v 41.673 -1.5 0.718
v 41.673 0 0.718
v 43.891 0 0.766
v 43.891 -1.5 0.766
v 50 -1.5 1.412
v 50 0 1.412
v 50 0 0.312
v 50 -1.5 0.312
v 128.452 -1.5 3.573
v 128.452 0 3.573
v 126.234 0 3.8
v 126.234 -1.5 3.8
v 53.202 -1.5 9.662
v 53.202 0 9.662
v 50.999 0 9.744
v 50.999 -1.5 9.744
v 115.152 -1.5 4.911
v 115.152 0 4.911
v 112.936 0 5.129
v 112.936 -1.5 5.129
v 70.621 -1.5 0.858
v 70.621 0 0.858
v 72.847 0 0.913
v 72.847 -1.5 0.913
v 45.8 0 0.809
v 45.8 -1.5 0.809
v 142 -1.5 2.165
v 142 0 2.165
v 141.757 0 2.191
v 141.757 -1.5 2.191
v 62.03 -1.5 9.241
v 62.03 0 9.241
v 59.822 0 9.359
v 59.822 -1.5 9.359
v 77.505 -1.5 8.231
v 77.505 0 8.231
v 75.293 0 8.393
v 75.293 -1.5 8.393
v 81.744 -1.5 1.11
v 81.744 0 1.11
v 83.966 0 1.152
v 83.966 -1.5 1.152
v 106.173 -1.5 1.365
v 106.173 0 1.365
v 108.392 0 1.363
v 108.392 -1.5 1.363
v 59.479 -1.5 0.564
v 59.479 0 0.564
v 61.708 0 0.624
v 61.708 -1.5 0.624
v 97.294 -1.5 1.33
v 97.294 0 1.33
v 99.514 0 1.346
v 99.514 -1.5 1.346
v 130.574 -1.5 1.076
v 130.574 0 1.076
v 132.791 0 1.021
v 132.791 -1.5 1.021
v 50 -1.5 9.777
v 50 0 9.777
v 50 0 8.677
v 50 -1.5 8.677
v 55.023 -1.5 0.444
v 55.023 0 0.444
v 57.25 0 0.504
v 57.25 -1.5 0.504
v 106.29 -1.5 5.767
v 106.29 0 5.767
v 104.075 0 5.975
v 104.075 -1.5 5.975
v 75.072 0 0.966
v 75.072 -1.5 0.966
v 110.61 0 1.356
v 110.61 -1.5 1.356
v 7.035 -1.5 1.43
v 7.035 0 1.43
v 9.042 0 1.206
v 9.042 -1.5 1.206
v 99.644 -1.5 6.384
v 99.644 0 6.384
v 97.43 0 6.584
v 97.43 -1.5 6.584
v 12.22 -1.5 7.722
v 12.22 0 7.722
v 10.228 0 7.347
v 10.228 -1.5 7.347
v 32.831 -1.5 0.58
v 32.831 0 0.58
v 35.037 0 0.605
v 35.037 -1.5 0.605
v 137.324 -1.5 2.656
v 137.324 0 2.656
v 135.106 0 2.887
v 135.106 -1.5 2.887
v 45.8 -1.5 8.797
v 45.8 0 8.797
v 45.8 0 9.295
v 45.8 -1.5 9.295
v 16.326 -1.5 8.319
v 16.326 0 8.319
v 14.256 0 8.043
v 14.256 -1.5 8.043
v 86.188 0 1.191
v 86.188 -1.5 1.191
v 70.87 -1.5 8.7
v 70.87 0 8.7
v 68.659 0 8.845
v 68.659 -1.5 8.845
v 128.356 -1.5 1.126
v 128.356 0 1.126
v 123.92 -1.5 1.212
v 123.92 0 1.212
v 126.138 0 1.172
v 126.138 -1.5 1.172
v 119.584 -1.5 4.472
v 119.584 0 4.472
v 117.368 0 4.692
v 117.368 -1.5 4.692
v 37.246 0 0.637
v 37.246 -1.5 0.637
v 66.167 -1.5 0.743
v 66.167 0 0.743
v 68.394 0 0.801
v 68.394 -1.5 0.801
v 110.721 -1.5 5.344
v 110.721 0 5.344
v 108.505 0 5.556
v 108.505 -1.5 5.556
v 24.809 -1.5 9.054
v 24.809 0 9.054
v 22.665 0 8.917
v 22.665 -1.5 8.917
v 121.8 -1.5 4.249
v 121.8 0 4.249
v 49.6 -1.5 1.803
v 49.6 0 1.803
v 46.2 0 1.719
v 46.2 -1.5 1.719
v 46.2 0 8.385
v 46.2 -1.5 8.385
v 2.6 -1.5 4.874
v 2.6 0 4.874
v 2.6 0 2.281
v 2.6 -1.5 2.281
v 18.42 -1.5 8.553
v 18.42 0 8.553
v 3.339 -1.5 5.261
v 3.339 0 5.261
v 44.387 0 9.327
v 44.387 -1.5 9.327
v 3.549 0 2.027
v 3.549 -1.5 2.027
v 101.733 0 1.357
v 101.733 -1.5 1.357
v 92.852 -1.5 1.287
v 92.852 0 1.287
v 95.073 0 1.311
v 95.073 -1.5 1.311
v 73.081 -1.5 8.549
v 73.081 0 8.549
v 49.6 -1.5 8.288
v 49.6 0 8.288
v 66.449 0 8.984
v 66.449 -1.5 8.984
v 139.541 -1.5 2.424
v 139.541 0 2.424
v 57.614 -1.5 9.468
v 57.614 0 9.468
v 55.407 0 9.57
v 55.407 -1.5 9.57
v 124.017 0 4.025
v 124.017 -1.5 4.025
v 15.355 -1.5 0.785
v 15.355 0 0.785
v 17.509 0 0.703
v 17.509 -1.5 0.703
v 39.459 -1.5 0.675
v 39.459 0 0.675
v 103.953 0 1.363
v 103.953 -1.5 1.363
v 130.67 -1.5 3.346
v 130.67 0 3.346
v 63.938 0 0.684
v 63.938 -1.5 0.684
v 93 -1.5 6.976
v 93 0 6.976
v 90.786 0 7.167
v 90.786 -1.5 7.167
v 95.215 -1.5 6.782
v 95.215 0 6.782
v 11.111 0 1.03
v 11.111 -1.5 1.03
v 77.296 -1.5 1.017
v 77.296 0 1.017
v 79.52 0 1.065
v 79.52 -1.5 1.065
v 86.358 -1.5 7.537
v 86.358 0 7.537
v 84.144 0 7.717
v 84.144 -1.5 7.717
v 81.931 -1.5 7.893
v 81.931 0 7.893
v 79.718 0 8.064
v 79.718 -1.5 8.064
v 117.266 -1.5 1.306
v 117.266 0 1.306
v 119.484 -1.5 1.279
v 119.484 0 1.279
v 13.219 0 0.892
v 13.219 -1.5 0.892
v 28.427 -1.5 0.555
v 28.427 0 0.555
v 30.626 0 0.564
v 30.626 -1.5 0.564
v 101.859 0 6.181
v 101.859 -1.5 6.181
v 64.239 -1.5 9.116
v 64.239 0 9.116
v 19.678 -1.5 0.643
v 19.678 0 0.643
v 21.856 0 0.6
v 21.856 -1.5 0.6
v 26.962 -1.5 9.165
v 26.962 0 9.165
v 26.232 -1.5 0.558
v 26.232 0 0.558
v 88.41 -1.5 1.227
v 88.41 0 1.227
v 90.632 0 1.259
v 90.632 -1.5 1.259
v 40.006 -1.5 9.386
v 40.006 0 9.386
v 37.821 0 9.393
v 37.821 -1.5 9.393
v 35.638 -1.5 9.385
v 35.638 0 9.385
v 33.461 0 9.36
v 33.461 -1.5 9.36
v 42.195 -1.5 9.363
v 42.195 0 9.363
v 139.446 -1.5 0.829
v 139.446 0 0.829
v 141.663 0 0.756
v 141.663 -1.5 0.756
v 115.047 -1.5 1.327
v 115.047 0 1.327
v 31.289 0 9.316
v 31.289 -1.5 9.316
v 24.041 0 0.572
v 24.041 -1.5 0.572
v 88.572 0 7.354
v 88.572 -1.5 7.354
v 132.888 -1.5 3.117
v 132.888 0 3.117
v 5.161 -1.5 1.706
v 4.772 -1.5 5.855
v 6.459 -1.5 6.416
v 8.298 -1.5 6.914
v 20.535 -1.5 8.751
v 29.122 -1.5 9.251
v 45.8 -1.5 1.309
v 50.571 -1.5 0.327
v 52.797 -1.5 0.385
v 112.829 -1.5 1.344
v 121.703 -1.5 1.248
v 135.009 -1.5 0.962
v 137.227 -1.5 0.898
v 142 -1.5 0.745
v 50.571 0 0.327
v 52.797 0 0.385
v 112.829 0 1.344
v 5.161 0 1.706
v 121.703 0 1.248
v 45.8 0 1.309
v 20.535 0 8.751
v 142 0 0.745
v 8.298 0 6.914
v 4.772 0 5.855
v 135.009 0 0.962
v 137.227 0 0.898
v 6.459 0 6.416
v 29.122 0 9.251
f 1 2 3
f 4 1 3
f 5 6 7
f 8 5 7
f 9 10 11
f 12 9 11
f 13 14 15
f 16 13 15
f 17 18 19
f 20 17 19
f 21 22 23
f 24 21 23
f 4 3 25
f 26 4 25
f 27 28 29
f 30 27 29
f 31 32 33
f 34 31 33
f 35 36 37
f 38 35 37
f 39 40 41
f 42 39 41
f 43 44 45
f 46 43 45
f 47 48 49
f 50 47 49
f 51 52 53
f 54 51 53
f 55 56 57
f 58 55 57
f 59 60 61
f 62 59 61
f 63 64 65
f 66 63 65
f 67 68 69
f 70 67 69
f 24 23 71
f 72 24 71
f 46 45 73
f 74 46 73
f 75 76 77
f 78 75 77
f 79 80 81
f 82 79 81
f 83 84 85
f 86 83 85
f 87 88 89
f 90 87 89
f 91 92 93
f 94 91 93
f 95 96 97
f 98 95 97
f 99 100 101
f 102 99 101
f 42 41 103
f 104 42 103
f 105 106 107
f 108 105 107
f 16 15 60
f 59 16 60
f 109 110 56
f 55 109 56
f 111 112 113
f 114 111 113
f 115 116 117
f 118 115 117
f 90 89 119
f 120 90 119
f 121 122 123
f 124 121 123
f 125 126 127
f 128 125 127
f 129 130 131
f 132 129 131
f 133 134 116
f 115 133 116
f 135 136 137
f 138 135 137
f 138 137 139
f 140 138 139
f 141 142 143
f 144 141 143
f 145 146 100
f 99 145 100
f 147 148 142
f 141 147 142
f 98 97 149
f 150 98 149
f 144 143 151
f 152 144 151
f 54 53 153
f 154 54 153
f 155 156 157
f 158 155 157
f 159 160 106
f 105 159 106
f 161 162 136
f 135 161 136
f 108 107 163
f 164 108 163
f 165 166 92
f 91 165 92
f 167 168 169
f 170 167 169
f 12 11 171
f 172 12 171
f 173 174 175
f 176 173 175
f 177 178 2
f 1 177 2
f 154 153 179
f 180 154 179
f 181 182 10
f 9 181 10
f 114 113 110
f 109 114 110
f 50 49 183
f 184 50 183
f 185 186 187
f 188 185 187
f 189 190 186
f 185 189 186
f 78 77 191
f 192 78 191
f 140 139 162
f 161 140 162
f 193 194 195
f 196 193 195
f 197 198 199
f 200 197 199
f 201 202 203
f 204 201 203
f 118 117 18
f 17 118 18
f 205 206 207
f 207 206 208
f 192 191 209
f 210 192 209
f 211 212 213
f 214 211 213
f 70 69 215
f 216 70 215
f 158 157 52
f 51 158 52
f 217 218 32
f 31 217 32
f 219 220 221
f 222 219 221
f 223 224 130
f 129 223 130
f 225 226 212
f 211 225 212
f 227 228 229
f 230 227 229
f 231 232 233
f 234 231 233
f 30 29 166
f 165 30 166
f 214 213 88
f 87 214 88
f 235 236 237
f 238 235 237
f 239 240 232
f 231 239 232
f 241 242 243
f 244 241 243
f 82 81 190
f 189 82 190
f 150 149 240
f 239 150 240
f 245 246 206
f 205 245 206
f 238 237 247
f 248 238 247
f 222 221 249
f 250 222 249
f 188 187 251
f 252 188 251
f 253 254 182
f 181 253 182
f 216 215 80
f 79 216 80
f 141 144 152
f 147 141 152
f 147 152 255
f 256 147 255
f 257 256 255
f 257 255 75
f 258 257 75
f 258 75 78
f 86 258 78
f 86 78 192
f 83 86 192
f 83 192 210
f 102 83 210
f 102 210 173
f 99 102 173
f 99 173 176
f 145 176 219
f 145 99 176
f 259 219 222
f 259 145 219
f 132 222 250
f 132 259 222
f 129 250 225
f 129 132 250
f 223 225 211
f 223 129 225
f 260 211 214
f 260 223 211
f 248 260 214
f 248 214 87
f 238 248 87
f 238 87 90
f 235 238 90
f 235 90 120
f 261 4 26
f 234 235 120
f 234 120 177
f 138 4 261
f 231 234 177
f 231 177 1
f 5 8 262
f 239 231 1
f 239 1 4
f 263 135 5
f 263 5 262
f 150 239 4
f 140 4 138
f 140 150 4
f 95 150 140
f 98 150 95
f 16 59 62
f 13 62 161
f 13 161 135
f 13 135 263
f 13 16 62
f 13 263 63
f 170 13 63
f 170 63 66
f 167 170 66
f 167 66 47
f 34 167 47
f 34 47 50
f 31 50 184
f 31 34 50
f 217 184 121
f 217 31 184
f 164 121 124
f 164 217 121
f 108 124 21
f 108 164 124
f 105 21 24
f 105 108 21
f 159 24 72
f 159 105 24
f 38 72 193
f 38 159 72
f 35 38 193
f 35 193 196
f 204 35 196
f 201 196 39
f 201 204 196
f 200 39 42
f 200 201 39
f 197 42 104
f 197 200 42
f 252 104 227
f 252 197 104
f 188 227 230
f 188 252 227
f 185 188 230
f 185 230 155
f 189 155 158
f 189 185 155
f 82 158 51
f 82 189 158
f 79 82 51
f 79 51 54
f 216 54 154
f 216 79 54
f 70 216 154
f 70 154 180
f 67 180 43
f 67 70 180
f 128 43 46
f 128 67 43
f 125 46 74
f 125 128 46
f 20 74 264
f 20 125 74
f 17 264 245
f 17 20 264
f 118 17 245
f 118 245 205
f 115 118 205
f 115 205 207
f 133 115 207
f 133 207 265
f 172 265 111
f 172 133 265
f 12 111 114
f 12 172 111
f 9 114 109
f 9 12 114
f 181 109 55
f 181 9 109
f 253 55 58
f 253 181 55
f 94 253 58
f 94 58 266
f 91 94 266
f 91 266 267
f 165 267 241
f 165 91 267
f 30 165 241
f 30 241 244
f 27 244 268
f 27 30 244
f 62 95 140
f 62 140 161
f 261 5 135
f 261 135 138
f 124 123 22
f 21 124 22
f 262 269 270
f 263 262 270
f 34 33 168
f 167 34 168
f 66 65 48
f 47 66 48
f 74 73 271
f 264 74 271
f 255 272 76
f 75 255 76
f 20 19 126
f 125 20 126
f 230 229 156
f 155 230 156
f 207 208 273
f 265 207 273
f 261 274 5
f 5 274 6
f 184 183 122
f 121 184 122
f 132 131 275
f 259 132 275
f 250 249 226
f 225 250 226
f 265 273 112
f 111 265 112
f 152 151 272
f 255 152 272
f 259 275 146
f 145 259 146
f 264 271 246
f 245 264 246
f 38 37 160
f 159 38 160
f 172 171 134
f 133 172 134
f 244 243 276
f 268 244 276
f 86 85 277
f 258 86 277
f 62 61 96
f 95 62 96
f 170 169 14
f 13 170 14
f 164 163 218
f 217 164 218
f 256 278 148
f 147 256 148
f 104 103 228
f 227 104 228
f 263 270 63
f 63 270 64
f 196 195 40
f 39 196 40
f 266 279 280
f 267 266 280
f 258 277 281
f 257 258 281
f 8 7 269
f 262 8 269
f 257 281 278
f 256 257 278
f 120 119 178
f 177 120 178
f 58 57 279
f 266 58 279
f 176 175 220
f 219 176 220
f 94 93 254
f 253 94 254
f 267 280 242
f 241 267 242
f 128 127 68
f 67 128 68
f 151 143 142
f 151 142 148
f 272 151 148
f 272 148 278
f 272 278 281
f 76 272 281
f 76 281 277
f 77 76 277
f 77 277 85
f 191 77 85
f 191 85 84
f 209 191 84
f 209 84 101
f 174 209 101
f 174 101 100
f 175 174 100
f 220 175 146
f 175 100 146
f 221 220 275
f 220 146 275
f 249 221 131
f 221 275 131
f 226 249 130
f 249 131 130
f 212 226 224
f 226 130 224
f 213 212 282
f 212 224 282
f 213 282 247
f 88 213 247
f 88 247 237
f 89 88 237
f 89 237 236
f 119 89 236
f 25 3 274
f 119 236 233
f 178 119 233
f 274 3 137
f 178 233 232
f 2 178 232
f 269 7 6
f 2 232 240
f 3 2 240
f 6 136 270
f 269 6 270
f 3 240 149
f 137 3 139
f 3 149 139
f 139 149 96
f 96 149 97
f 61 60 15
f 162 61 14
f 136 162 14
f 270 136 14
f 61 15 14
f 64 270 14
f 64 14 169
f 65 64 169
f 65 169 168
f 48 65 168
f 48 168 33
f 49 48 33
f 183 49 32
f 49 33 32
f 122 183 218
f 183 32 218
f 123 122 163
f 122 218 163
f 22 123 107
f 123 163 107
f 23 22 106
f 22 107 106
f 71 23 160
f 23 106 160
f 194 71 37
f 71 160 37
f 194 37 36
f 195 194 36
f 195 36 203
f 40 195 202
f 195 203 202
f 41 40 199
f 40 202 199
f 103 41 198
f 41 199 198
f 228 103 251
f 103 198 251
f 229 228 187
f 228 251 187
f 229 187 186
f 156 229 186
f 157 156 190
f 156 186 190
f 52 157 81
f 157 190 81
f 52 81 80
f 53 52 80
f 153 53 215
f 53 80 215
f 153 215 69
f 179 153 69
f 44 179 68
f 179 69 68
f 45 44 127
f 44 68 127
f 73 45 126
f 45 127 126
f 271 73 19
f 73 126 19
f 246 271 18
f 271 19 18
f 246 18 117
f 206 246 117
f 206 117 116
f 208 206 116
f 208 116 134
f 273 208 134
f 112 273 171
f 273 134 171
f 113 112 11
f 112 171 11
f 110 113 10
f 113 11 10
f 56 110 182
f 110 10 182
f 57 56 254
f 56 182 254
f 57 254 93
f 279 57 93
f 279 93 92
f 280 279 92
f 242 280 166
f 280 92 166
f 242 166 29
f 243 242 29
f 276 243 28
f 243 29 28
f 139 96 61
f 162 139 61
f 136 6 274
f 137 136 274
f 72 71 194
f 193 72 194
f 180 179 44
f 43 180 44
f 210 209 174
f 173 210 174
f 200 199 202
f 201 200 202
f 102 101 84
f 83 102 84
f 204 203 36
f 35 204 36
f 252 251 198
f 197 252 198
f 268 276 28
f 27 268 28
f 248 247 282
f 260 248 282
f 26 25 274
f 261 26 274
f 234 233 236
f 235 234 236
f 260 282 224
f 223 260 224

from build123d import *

# Parameters (mm, degrees)
F1_DEPTH = 1.5


with BuildPart() as f1:
    # F0 (on Front) → F1 (new body)
    with BuildSketch(Plane.XZ):
        Polygon((142, 0.744528), (142, 2.164764), (141.756827, 2.19059), (139.541293, 2.423936), (137.324294, 2.656031), (135.106149, 2.886867), (132.88798, 3.116584), (130.669795, 3.345501), (128.451744, 3.573135), (126.234164, 3.7998), (124.017352, 4.02517), (121.800354, 4.249262), (119.583974, 4.471743), (117.368021, 4.692455), (115.151901, 4.911409), (112.936198, 5.128596), (110.720621, 5.343539), (108.505003, 5.556403), (106.289822, 5.767177), (104.074761, 5.975389), (101.859485, 6.181045), (99.644312, 6.384138), (97.429734, 6.584339), (95.215088, 6.78166), (93.000228, 6.975786), (90.786095, 7.166536), (88.57206, 7.353924), (86.358261, 7.537466), (84.144403, 7.717329), (81.931096, 7.892861), (79.718029, 8.064226), (77.505344, 8.230784), (75.293052, 8.392693), (73.081283, 8.54899), (70.869743, 8.700002), (68.658555, 8.845086), (66.448529, 8.983746), (64.238854, 9.115998), (62.029837, 9.241035), (59.821802, 9.358852), (57.614246, 9.468338), (55.40733, 9.56965), (53.202479, 9.66212), (50.999186, 9.744478), (50, 9.777187), (50, 9.176866), (50, 8.676866), (45.8, 8.796636), (45.8, 9.295403), (44.38743, 9.326976), (42.195028, 9.363203), (40.005971, 9.385624), (37.820648, 9.393445), (35.638372, 9.38508), (33.46094, 9.359864), (31.288811, 9.315884), (29.121512, 9.25124), (26.961716, 9.164939), (24.808649, 9.054142), (22.665116, 8.917385), (20.535486, 8.751442), (18.420289, 8.553003), (16.32601, 8.318523), (14.255856, 8.043134), (12.220146, 7.721582), (10.227654, 7.347338), (8.29762, 6.913726), (6.459442, 6.415771), (4.772328, 5.855327), (3.339039, 5.261104), (2.6, 4.874359), (2.6, 2.281296), (3.54864, 2.027292), (5.160734, 1.706243), (7.035389, 1.430159), (9.042427, 1.206093), (11.110739, 1.029503), (13.219002, 0.891719), (15.354544, 0.785013), (17.509289, 0.703408), (19.677506, 0.643066), (21.855885, 0.599925), (24.040762, 0.572311), (26.231517, 0.557847), (28.42657, 0.55545), (30.626296, 0.563519), (32.830683, 0.580297), (35.036932, 0.6052), (37.246467, 0.636923), (39.459078, 0.67483), (41.673422, 0.717829), (43.890675, 0.765579), (45.8, 0.809465), (45.8, 1.309141), (50, 1.41249), (50, 0.91249), (50, 0.312298), (50.571337, 0.326729), (52.79658, 0.384609), (55.0228, 0.44359), (57.249999, 0.503512), (59.478643, 0.563725), (61.708406, 0.623917), (63.938004, 0.683632), (66.16679, 0.742883), (68.394113, 0.800722), (70.621092, 0.857607), (72.847394, 0.912586), (75.072228, 0.965833), (77.295889, 1.016542), (79.520133, 1.064679), (81.743687, 1.10995), (83.96622, 1.15236), (86.18805, 1.191263), (88.410448, 1.226794), (90.631991, 1.258821), (92.852476, 1.286708), (95.073211, 1.31059), (97.294022, 1.330149), (99.514112, 1.345721), (101.733314, 1.35667), (103.953387, 1.363282), (106.172898, 1.365423), (108.391513, 1.362941), (110.610191, 1.355657), (112.829109, 1.343727), (115.047447, 1.327167), (117.265542, 1.305652), (119.484324, 1.279322), (121.702527, 1.248363), (123.920164, 1.212293), (126.138363, 1.171732), (128.356467, 1.126372), (130.5735, 1.076232), (132.791416, 1.021273), (135.009404, 0.961833), (137.226808, 0.897602), (139.445556, 0.829025), (141.662807, 0.756316), align=None)
        Polygon((46.2, 1.719105), (46.2, 8.385067), (49.6, 8.28811), (49.6, 1.802768), align=None, mode=Mode.SUBTRACT)
    extrude(amount=F1_DEPTH)


solid = f1.part
